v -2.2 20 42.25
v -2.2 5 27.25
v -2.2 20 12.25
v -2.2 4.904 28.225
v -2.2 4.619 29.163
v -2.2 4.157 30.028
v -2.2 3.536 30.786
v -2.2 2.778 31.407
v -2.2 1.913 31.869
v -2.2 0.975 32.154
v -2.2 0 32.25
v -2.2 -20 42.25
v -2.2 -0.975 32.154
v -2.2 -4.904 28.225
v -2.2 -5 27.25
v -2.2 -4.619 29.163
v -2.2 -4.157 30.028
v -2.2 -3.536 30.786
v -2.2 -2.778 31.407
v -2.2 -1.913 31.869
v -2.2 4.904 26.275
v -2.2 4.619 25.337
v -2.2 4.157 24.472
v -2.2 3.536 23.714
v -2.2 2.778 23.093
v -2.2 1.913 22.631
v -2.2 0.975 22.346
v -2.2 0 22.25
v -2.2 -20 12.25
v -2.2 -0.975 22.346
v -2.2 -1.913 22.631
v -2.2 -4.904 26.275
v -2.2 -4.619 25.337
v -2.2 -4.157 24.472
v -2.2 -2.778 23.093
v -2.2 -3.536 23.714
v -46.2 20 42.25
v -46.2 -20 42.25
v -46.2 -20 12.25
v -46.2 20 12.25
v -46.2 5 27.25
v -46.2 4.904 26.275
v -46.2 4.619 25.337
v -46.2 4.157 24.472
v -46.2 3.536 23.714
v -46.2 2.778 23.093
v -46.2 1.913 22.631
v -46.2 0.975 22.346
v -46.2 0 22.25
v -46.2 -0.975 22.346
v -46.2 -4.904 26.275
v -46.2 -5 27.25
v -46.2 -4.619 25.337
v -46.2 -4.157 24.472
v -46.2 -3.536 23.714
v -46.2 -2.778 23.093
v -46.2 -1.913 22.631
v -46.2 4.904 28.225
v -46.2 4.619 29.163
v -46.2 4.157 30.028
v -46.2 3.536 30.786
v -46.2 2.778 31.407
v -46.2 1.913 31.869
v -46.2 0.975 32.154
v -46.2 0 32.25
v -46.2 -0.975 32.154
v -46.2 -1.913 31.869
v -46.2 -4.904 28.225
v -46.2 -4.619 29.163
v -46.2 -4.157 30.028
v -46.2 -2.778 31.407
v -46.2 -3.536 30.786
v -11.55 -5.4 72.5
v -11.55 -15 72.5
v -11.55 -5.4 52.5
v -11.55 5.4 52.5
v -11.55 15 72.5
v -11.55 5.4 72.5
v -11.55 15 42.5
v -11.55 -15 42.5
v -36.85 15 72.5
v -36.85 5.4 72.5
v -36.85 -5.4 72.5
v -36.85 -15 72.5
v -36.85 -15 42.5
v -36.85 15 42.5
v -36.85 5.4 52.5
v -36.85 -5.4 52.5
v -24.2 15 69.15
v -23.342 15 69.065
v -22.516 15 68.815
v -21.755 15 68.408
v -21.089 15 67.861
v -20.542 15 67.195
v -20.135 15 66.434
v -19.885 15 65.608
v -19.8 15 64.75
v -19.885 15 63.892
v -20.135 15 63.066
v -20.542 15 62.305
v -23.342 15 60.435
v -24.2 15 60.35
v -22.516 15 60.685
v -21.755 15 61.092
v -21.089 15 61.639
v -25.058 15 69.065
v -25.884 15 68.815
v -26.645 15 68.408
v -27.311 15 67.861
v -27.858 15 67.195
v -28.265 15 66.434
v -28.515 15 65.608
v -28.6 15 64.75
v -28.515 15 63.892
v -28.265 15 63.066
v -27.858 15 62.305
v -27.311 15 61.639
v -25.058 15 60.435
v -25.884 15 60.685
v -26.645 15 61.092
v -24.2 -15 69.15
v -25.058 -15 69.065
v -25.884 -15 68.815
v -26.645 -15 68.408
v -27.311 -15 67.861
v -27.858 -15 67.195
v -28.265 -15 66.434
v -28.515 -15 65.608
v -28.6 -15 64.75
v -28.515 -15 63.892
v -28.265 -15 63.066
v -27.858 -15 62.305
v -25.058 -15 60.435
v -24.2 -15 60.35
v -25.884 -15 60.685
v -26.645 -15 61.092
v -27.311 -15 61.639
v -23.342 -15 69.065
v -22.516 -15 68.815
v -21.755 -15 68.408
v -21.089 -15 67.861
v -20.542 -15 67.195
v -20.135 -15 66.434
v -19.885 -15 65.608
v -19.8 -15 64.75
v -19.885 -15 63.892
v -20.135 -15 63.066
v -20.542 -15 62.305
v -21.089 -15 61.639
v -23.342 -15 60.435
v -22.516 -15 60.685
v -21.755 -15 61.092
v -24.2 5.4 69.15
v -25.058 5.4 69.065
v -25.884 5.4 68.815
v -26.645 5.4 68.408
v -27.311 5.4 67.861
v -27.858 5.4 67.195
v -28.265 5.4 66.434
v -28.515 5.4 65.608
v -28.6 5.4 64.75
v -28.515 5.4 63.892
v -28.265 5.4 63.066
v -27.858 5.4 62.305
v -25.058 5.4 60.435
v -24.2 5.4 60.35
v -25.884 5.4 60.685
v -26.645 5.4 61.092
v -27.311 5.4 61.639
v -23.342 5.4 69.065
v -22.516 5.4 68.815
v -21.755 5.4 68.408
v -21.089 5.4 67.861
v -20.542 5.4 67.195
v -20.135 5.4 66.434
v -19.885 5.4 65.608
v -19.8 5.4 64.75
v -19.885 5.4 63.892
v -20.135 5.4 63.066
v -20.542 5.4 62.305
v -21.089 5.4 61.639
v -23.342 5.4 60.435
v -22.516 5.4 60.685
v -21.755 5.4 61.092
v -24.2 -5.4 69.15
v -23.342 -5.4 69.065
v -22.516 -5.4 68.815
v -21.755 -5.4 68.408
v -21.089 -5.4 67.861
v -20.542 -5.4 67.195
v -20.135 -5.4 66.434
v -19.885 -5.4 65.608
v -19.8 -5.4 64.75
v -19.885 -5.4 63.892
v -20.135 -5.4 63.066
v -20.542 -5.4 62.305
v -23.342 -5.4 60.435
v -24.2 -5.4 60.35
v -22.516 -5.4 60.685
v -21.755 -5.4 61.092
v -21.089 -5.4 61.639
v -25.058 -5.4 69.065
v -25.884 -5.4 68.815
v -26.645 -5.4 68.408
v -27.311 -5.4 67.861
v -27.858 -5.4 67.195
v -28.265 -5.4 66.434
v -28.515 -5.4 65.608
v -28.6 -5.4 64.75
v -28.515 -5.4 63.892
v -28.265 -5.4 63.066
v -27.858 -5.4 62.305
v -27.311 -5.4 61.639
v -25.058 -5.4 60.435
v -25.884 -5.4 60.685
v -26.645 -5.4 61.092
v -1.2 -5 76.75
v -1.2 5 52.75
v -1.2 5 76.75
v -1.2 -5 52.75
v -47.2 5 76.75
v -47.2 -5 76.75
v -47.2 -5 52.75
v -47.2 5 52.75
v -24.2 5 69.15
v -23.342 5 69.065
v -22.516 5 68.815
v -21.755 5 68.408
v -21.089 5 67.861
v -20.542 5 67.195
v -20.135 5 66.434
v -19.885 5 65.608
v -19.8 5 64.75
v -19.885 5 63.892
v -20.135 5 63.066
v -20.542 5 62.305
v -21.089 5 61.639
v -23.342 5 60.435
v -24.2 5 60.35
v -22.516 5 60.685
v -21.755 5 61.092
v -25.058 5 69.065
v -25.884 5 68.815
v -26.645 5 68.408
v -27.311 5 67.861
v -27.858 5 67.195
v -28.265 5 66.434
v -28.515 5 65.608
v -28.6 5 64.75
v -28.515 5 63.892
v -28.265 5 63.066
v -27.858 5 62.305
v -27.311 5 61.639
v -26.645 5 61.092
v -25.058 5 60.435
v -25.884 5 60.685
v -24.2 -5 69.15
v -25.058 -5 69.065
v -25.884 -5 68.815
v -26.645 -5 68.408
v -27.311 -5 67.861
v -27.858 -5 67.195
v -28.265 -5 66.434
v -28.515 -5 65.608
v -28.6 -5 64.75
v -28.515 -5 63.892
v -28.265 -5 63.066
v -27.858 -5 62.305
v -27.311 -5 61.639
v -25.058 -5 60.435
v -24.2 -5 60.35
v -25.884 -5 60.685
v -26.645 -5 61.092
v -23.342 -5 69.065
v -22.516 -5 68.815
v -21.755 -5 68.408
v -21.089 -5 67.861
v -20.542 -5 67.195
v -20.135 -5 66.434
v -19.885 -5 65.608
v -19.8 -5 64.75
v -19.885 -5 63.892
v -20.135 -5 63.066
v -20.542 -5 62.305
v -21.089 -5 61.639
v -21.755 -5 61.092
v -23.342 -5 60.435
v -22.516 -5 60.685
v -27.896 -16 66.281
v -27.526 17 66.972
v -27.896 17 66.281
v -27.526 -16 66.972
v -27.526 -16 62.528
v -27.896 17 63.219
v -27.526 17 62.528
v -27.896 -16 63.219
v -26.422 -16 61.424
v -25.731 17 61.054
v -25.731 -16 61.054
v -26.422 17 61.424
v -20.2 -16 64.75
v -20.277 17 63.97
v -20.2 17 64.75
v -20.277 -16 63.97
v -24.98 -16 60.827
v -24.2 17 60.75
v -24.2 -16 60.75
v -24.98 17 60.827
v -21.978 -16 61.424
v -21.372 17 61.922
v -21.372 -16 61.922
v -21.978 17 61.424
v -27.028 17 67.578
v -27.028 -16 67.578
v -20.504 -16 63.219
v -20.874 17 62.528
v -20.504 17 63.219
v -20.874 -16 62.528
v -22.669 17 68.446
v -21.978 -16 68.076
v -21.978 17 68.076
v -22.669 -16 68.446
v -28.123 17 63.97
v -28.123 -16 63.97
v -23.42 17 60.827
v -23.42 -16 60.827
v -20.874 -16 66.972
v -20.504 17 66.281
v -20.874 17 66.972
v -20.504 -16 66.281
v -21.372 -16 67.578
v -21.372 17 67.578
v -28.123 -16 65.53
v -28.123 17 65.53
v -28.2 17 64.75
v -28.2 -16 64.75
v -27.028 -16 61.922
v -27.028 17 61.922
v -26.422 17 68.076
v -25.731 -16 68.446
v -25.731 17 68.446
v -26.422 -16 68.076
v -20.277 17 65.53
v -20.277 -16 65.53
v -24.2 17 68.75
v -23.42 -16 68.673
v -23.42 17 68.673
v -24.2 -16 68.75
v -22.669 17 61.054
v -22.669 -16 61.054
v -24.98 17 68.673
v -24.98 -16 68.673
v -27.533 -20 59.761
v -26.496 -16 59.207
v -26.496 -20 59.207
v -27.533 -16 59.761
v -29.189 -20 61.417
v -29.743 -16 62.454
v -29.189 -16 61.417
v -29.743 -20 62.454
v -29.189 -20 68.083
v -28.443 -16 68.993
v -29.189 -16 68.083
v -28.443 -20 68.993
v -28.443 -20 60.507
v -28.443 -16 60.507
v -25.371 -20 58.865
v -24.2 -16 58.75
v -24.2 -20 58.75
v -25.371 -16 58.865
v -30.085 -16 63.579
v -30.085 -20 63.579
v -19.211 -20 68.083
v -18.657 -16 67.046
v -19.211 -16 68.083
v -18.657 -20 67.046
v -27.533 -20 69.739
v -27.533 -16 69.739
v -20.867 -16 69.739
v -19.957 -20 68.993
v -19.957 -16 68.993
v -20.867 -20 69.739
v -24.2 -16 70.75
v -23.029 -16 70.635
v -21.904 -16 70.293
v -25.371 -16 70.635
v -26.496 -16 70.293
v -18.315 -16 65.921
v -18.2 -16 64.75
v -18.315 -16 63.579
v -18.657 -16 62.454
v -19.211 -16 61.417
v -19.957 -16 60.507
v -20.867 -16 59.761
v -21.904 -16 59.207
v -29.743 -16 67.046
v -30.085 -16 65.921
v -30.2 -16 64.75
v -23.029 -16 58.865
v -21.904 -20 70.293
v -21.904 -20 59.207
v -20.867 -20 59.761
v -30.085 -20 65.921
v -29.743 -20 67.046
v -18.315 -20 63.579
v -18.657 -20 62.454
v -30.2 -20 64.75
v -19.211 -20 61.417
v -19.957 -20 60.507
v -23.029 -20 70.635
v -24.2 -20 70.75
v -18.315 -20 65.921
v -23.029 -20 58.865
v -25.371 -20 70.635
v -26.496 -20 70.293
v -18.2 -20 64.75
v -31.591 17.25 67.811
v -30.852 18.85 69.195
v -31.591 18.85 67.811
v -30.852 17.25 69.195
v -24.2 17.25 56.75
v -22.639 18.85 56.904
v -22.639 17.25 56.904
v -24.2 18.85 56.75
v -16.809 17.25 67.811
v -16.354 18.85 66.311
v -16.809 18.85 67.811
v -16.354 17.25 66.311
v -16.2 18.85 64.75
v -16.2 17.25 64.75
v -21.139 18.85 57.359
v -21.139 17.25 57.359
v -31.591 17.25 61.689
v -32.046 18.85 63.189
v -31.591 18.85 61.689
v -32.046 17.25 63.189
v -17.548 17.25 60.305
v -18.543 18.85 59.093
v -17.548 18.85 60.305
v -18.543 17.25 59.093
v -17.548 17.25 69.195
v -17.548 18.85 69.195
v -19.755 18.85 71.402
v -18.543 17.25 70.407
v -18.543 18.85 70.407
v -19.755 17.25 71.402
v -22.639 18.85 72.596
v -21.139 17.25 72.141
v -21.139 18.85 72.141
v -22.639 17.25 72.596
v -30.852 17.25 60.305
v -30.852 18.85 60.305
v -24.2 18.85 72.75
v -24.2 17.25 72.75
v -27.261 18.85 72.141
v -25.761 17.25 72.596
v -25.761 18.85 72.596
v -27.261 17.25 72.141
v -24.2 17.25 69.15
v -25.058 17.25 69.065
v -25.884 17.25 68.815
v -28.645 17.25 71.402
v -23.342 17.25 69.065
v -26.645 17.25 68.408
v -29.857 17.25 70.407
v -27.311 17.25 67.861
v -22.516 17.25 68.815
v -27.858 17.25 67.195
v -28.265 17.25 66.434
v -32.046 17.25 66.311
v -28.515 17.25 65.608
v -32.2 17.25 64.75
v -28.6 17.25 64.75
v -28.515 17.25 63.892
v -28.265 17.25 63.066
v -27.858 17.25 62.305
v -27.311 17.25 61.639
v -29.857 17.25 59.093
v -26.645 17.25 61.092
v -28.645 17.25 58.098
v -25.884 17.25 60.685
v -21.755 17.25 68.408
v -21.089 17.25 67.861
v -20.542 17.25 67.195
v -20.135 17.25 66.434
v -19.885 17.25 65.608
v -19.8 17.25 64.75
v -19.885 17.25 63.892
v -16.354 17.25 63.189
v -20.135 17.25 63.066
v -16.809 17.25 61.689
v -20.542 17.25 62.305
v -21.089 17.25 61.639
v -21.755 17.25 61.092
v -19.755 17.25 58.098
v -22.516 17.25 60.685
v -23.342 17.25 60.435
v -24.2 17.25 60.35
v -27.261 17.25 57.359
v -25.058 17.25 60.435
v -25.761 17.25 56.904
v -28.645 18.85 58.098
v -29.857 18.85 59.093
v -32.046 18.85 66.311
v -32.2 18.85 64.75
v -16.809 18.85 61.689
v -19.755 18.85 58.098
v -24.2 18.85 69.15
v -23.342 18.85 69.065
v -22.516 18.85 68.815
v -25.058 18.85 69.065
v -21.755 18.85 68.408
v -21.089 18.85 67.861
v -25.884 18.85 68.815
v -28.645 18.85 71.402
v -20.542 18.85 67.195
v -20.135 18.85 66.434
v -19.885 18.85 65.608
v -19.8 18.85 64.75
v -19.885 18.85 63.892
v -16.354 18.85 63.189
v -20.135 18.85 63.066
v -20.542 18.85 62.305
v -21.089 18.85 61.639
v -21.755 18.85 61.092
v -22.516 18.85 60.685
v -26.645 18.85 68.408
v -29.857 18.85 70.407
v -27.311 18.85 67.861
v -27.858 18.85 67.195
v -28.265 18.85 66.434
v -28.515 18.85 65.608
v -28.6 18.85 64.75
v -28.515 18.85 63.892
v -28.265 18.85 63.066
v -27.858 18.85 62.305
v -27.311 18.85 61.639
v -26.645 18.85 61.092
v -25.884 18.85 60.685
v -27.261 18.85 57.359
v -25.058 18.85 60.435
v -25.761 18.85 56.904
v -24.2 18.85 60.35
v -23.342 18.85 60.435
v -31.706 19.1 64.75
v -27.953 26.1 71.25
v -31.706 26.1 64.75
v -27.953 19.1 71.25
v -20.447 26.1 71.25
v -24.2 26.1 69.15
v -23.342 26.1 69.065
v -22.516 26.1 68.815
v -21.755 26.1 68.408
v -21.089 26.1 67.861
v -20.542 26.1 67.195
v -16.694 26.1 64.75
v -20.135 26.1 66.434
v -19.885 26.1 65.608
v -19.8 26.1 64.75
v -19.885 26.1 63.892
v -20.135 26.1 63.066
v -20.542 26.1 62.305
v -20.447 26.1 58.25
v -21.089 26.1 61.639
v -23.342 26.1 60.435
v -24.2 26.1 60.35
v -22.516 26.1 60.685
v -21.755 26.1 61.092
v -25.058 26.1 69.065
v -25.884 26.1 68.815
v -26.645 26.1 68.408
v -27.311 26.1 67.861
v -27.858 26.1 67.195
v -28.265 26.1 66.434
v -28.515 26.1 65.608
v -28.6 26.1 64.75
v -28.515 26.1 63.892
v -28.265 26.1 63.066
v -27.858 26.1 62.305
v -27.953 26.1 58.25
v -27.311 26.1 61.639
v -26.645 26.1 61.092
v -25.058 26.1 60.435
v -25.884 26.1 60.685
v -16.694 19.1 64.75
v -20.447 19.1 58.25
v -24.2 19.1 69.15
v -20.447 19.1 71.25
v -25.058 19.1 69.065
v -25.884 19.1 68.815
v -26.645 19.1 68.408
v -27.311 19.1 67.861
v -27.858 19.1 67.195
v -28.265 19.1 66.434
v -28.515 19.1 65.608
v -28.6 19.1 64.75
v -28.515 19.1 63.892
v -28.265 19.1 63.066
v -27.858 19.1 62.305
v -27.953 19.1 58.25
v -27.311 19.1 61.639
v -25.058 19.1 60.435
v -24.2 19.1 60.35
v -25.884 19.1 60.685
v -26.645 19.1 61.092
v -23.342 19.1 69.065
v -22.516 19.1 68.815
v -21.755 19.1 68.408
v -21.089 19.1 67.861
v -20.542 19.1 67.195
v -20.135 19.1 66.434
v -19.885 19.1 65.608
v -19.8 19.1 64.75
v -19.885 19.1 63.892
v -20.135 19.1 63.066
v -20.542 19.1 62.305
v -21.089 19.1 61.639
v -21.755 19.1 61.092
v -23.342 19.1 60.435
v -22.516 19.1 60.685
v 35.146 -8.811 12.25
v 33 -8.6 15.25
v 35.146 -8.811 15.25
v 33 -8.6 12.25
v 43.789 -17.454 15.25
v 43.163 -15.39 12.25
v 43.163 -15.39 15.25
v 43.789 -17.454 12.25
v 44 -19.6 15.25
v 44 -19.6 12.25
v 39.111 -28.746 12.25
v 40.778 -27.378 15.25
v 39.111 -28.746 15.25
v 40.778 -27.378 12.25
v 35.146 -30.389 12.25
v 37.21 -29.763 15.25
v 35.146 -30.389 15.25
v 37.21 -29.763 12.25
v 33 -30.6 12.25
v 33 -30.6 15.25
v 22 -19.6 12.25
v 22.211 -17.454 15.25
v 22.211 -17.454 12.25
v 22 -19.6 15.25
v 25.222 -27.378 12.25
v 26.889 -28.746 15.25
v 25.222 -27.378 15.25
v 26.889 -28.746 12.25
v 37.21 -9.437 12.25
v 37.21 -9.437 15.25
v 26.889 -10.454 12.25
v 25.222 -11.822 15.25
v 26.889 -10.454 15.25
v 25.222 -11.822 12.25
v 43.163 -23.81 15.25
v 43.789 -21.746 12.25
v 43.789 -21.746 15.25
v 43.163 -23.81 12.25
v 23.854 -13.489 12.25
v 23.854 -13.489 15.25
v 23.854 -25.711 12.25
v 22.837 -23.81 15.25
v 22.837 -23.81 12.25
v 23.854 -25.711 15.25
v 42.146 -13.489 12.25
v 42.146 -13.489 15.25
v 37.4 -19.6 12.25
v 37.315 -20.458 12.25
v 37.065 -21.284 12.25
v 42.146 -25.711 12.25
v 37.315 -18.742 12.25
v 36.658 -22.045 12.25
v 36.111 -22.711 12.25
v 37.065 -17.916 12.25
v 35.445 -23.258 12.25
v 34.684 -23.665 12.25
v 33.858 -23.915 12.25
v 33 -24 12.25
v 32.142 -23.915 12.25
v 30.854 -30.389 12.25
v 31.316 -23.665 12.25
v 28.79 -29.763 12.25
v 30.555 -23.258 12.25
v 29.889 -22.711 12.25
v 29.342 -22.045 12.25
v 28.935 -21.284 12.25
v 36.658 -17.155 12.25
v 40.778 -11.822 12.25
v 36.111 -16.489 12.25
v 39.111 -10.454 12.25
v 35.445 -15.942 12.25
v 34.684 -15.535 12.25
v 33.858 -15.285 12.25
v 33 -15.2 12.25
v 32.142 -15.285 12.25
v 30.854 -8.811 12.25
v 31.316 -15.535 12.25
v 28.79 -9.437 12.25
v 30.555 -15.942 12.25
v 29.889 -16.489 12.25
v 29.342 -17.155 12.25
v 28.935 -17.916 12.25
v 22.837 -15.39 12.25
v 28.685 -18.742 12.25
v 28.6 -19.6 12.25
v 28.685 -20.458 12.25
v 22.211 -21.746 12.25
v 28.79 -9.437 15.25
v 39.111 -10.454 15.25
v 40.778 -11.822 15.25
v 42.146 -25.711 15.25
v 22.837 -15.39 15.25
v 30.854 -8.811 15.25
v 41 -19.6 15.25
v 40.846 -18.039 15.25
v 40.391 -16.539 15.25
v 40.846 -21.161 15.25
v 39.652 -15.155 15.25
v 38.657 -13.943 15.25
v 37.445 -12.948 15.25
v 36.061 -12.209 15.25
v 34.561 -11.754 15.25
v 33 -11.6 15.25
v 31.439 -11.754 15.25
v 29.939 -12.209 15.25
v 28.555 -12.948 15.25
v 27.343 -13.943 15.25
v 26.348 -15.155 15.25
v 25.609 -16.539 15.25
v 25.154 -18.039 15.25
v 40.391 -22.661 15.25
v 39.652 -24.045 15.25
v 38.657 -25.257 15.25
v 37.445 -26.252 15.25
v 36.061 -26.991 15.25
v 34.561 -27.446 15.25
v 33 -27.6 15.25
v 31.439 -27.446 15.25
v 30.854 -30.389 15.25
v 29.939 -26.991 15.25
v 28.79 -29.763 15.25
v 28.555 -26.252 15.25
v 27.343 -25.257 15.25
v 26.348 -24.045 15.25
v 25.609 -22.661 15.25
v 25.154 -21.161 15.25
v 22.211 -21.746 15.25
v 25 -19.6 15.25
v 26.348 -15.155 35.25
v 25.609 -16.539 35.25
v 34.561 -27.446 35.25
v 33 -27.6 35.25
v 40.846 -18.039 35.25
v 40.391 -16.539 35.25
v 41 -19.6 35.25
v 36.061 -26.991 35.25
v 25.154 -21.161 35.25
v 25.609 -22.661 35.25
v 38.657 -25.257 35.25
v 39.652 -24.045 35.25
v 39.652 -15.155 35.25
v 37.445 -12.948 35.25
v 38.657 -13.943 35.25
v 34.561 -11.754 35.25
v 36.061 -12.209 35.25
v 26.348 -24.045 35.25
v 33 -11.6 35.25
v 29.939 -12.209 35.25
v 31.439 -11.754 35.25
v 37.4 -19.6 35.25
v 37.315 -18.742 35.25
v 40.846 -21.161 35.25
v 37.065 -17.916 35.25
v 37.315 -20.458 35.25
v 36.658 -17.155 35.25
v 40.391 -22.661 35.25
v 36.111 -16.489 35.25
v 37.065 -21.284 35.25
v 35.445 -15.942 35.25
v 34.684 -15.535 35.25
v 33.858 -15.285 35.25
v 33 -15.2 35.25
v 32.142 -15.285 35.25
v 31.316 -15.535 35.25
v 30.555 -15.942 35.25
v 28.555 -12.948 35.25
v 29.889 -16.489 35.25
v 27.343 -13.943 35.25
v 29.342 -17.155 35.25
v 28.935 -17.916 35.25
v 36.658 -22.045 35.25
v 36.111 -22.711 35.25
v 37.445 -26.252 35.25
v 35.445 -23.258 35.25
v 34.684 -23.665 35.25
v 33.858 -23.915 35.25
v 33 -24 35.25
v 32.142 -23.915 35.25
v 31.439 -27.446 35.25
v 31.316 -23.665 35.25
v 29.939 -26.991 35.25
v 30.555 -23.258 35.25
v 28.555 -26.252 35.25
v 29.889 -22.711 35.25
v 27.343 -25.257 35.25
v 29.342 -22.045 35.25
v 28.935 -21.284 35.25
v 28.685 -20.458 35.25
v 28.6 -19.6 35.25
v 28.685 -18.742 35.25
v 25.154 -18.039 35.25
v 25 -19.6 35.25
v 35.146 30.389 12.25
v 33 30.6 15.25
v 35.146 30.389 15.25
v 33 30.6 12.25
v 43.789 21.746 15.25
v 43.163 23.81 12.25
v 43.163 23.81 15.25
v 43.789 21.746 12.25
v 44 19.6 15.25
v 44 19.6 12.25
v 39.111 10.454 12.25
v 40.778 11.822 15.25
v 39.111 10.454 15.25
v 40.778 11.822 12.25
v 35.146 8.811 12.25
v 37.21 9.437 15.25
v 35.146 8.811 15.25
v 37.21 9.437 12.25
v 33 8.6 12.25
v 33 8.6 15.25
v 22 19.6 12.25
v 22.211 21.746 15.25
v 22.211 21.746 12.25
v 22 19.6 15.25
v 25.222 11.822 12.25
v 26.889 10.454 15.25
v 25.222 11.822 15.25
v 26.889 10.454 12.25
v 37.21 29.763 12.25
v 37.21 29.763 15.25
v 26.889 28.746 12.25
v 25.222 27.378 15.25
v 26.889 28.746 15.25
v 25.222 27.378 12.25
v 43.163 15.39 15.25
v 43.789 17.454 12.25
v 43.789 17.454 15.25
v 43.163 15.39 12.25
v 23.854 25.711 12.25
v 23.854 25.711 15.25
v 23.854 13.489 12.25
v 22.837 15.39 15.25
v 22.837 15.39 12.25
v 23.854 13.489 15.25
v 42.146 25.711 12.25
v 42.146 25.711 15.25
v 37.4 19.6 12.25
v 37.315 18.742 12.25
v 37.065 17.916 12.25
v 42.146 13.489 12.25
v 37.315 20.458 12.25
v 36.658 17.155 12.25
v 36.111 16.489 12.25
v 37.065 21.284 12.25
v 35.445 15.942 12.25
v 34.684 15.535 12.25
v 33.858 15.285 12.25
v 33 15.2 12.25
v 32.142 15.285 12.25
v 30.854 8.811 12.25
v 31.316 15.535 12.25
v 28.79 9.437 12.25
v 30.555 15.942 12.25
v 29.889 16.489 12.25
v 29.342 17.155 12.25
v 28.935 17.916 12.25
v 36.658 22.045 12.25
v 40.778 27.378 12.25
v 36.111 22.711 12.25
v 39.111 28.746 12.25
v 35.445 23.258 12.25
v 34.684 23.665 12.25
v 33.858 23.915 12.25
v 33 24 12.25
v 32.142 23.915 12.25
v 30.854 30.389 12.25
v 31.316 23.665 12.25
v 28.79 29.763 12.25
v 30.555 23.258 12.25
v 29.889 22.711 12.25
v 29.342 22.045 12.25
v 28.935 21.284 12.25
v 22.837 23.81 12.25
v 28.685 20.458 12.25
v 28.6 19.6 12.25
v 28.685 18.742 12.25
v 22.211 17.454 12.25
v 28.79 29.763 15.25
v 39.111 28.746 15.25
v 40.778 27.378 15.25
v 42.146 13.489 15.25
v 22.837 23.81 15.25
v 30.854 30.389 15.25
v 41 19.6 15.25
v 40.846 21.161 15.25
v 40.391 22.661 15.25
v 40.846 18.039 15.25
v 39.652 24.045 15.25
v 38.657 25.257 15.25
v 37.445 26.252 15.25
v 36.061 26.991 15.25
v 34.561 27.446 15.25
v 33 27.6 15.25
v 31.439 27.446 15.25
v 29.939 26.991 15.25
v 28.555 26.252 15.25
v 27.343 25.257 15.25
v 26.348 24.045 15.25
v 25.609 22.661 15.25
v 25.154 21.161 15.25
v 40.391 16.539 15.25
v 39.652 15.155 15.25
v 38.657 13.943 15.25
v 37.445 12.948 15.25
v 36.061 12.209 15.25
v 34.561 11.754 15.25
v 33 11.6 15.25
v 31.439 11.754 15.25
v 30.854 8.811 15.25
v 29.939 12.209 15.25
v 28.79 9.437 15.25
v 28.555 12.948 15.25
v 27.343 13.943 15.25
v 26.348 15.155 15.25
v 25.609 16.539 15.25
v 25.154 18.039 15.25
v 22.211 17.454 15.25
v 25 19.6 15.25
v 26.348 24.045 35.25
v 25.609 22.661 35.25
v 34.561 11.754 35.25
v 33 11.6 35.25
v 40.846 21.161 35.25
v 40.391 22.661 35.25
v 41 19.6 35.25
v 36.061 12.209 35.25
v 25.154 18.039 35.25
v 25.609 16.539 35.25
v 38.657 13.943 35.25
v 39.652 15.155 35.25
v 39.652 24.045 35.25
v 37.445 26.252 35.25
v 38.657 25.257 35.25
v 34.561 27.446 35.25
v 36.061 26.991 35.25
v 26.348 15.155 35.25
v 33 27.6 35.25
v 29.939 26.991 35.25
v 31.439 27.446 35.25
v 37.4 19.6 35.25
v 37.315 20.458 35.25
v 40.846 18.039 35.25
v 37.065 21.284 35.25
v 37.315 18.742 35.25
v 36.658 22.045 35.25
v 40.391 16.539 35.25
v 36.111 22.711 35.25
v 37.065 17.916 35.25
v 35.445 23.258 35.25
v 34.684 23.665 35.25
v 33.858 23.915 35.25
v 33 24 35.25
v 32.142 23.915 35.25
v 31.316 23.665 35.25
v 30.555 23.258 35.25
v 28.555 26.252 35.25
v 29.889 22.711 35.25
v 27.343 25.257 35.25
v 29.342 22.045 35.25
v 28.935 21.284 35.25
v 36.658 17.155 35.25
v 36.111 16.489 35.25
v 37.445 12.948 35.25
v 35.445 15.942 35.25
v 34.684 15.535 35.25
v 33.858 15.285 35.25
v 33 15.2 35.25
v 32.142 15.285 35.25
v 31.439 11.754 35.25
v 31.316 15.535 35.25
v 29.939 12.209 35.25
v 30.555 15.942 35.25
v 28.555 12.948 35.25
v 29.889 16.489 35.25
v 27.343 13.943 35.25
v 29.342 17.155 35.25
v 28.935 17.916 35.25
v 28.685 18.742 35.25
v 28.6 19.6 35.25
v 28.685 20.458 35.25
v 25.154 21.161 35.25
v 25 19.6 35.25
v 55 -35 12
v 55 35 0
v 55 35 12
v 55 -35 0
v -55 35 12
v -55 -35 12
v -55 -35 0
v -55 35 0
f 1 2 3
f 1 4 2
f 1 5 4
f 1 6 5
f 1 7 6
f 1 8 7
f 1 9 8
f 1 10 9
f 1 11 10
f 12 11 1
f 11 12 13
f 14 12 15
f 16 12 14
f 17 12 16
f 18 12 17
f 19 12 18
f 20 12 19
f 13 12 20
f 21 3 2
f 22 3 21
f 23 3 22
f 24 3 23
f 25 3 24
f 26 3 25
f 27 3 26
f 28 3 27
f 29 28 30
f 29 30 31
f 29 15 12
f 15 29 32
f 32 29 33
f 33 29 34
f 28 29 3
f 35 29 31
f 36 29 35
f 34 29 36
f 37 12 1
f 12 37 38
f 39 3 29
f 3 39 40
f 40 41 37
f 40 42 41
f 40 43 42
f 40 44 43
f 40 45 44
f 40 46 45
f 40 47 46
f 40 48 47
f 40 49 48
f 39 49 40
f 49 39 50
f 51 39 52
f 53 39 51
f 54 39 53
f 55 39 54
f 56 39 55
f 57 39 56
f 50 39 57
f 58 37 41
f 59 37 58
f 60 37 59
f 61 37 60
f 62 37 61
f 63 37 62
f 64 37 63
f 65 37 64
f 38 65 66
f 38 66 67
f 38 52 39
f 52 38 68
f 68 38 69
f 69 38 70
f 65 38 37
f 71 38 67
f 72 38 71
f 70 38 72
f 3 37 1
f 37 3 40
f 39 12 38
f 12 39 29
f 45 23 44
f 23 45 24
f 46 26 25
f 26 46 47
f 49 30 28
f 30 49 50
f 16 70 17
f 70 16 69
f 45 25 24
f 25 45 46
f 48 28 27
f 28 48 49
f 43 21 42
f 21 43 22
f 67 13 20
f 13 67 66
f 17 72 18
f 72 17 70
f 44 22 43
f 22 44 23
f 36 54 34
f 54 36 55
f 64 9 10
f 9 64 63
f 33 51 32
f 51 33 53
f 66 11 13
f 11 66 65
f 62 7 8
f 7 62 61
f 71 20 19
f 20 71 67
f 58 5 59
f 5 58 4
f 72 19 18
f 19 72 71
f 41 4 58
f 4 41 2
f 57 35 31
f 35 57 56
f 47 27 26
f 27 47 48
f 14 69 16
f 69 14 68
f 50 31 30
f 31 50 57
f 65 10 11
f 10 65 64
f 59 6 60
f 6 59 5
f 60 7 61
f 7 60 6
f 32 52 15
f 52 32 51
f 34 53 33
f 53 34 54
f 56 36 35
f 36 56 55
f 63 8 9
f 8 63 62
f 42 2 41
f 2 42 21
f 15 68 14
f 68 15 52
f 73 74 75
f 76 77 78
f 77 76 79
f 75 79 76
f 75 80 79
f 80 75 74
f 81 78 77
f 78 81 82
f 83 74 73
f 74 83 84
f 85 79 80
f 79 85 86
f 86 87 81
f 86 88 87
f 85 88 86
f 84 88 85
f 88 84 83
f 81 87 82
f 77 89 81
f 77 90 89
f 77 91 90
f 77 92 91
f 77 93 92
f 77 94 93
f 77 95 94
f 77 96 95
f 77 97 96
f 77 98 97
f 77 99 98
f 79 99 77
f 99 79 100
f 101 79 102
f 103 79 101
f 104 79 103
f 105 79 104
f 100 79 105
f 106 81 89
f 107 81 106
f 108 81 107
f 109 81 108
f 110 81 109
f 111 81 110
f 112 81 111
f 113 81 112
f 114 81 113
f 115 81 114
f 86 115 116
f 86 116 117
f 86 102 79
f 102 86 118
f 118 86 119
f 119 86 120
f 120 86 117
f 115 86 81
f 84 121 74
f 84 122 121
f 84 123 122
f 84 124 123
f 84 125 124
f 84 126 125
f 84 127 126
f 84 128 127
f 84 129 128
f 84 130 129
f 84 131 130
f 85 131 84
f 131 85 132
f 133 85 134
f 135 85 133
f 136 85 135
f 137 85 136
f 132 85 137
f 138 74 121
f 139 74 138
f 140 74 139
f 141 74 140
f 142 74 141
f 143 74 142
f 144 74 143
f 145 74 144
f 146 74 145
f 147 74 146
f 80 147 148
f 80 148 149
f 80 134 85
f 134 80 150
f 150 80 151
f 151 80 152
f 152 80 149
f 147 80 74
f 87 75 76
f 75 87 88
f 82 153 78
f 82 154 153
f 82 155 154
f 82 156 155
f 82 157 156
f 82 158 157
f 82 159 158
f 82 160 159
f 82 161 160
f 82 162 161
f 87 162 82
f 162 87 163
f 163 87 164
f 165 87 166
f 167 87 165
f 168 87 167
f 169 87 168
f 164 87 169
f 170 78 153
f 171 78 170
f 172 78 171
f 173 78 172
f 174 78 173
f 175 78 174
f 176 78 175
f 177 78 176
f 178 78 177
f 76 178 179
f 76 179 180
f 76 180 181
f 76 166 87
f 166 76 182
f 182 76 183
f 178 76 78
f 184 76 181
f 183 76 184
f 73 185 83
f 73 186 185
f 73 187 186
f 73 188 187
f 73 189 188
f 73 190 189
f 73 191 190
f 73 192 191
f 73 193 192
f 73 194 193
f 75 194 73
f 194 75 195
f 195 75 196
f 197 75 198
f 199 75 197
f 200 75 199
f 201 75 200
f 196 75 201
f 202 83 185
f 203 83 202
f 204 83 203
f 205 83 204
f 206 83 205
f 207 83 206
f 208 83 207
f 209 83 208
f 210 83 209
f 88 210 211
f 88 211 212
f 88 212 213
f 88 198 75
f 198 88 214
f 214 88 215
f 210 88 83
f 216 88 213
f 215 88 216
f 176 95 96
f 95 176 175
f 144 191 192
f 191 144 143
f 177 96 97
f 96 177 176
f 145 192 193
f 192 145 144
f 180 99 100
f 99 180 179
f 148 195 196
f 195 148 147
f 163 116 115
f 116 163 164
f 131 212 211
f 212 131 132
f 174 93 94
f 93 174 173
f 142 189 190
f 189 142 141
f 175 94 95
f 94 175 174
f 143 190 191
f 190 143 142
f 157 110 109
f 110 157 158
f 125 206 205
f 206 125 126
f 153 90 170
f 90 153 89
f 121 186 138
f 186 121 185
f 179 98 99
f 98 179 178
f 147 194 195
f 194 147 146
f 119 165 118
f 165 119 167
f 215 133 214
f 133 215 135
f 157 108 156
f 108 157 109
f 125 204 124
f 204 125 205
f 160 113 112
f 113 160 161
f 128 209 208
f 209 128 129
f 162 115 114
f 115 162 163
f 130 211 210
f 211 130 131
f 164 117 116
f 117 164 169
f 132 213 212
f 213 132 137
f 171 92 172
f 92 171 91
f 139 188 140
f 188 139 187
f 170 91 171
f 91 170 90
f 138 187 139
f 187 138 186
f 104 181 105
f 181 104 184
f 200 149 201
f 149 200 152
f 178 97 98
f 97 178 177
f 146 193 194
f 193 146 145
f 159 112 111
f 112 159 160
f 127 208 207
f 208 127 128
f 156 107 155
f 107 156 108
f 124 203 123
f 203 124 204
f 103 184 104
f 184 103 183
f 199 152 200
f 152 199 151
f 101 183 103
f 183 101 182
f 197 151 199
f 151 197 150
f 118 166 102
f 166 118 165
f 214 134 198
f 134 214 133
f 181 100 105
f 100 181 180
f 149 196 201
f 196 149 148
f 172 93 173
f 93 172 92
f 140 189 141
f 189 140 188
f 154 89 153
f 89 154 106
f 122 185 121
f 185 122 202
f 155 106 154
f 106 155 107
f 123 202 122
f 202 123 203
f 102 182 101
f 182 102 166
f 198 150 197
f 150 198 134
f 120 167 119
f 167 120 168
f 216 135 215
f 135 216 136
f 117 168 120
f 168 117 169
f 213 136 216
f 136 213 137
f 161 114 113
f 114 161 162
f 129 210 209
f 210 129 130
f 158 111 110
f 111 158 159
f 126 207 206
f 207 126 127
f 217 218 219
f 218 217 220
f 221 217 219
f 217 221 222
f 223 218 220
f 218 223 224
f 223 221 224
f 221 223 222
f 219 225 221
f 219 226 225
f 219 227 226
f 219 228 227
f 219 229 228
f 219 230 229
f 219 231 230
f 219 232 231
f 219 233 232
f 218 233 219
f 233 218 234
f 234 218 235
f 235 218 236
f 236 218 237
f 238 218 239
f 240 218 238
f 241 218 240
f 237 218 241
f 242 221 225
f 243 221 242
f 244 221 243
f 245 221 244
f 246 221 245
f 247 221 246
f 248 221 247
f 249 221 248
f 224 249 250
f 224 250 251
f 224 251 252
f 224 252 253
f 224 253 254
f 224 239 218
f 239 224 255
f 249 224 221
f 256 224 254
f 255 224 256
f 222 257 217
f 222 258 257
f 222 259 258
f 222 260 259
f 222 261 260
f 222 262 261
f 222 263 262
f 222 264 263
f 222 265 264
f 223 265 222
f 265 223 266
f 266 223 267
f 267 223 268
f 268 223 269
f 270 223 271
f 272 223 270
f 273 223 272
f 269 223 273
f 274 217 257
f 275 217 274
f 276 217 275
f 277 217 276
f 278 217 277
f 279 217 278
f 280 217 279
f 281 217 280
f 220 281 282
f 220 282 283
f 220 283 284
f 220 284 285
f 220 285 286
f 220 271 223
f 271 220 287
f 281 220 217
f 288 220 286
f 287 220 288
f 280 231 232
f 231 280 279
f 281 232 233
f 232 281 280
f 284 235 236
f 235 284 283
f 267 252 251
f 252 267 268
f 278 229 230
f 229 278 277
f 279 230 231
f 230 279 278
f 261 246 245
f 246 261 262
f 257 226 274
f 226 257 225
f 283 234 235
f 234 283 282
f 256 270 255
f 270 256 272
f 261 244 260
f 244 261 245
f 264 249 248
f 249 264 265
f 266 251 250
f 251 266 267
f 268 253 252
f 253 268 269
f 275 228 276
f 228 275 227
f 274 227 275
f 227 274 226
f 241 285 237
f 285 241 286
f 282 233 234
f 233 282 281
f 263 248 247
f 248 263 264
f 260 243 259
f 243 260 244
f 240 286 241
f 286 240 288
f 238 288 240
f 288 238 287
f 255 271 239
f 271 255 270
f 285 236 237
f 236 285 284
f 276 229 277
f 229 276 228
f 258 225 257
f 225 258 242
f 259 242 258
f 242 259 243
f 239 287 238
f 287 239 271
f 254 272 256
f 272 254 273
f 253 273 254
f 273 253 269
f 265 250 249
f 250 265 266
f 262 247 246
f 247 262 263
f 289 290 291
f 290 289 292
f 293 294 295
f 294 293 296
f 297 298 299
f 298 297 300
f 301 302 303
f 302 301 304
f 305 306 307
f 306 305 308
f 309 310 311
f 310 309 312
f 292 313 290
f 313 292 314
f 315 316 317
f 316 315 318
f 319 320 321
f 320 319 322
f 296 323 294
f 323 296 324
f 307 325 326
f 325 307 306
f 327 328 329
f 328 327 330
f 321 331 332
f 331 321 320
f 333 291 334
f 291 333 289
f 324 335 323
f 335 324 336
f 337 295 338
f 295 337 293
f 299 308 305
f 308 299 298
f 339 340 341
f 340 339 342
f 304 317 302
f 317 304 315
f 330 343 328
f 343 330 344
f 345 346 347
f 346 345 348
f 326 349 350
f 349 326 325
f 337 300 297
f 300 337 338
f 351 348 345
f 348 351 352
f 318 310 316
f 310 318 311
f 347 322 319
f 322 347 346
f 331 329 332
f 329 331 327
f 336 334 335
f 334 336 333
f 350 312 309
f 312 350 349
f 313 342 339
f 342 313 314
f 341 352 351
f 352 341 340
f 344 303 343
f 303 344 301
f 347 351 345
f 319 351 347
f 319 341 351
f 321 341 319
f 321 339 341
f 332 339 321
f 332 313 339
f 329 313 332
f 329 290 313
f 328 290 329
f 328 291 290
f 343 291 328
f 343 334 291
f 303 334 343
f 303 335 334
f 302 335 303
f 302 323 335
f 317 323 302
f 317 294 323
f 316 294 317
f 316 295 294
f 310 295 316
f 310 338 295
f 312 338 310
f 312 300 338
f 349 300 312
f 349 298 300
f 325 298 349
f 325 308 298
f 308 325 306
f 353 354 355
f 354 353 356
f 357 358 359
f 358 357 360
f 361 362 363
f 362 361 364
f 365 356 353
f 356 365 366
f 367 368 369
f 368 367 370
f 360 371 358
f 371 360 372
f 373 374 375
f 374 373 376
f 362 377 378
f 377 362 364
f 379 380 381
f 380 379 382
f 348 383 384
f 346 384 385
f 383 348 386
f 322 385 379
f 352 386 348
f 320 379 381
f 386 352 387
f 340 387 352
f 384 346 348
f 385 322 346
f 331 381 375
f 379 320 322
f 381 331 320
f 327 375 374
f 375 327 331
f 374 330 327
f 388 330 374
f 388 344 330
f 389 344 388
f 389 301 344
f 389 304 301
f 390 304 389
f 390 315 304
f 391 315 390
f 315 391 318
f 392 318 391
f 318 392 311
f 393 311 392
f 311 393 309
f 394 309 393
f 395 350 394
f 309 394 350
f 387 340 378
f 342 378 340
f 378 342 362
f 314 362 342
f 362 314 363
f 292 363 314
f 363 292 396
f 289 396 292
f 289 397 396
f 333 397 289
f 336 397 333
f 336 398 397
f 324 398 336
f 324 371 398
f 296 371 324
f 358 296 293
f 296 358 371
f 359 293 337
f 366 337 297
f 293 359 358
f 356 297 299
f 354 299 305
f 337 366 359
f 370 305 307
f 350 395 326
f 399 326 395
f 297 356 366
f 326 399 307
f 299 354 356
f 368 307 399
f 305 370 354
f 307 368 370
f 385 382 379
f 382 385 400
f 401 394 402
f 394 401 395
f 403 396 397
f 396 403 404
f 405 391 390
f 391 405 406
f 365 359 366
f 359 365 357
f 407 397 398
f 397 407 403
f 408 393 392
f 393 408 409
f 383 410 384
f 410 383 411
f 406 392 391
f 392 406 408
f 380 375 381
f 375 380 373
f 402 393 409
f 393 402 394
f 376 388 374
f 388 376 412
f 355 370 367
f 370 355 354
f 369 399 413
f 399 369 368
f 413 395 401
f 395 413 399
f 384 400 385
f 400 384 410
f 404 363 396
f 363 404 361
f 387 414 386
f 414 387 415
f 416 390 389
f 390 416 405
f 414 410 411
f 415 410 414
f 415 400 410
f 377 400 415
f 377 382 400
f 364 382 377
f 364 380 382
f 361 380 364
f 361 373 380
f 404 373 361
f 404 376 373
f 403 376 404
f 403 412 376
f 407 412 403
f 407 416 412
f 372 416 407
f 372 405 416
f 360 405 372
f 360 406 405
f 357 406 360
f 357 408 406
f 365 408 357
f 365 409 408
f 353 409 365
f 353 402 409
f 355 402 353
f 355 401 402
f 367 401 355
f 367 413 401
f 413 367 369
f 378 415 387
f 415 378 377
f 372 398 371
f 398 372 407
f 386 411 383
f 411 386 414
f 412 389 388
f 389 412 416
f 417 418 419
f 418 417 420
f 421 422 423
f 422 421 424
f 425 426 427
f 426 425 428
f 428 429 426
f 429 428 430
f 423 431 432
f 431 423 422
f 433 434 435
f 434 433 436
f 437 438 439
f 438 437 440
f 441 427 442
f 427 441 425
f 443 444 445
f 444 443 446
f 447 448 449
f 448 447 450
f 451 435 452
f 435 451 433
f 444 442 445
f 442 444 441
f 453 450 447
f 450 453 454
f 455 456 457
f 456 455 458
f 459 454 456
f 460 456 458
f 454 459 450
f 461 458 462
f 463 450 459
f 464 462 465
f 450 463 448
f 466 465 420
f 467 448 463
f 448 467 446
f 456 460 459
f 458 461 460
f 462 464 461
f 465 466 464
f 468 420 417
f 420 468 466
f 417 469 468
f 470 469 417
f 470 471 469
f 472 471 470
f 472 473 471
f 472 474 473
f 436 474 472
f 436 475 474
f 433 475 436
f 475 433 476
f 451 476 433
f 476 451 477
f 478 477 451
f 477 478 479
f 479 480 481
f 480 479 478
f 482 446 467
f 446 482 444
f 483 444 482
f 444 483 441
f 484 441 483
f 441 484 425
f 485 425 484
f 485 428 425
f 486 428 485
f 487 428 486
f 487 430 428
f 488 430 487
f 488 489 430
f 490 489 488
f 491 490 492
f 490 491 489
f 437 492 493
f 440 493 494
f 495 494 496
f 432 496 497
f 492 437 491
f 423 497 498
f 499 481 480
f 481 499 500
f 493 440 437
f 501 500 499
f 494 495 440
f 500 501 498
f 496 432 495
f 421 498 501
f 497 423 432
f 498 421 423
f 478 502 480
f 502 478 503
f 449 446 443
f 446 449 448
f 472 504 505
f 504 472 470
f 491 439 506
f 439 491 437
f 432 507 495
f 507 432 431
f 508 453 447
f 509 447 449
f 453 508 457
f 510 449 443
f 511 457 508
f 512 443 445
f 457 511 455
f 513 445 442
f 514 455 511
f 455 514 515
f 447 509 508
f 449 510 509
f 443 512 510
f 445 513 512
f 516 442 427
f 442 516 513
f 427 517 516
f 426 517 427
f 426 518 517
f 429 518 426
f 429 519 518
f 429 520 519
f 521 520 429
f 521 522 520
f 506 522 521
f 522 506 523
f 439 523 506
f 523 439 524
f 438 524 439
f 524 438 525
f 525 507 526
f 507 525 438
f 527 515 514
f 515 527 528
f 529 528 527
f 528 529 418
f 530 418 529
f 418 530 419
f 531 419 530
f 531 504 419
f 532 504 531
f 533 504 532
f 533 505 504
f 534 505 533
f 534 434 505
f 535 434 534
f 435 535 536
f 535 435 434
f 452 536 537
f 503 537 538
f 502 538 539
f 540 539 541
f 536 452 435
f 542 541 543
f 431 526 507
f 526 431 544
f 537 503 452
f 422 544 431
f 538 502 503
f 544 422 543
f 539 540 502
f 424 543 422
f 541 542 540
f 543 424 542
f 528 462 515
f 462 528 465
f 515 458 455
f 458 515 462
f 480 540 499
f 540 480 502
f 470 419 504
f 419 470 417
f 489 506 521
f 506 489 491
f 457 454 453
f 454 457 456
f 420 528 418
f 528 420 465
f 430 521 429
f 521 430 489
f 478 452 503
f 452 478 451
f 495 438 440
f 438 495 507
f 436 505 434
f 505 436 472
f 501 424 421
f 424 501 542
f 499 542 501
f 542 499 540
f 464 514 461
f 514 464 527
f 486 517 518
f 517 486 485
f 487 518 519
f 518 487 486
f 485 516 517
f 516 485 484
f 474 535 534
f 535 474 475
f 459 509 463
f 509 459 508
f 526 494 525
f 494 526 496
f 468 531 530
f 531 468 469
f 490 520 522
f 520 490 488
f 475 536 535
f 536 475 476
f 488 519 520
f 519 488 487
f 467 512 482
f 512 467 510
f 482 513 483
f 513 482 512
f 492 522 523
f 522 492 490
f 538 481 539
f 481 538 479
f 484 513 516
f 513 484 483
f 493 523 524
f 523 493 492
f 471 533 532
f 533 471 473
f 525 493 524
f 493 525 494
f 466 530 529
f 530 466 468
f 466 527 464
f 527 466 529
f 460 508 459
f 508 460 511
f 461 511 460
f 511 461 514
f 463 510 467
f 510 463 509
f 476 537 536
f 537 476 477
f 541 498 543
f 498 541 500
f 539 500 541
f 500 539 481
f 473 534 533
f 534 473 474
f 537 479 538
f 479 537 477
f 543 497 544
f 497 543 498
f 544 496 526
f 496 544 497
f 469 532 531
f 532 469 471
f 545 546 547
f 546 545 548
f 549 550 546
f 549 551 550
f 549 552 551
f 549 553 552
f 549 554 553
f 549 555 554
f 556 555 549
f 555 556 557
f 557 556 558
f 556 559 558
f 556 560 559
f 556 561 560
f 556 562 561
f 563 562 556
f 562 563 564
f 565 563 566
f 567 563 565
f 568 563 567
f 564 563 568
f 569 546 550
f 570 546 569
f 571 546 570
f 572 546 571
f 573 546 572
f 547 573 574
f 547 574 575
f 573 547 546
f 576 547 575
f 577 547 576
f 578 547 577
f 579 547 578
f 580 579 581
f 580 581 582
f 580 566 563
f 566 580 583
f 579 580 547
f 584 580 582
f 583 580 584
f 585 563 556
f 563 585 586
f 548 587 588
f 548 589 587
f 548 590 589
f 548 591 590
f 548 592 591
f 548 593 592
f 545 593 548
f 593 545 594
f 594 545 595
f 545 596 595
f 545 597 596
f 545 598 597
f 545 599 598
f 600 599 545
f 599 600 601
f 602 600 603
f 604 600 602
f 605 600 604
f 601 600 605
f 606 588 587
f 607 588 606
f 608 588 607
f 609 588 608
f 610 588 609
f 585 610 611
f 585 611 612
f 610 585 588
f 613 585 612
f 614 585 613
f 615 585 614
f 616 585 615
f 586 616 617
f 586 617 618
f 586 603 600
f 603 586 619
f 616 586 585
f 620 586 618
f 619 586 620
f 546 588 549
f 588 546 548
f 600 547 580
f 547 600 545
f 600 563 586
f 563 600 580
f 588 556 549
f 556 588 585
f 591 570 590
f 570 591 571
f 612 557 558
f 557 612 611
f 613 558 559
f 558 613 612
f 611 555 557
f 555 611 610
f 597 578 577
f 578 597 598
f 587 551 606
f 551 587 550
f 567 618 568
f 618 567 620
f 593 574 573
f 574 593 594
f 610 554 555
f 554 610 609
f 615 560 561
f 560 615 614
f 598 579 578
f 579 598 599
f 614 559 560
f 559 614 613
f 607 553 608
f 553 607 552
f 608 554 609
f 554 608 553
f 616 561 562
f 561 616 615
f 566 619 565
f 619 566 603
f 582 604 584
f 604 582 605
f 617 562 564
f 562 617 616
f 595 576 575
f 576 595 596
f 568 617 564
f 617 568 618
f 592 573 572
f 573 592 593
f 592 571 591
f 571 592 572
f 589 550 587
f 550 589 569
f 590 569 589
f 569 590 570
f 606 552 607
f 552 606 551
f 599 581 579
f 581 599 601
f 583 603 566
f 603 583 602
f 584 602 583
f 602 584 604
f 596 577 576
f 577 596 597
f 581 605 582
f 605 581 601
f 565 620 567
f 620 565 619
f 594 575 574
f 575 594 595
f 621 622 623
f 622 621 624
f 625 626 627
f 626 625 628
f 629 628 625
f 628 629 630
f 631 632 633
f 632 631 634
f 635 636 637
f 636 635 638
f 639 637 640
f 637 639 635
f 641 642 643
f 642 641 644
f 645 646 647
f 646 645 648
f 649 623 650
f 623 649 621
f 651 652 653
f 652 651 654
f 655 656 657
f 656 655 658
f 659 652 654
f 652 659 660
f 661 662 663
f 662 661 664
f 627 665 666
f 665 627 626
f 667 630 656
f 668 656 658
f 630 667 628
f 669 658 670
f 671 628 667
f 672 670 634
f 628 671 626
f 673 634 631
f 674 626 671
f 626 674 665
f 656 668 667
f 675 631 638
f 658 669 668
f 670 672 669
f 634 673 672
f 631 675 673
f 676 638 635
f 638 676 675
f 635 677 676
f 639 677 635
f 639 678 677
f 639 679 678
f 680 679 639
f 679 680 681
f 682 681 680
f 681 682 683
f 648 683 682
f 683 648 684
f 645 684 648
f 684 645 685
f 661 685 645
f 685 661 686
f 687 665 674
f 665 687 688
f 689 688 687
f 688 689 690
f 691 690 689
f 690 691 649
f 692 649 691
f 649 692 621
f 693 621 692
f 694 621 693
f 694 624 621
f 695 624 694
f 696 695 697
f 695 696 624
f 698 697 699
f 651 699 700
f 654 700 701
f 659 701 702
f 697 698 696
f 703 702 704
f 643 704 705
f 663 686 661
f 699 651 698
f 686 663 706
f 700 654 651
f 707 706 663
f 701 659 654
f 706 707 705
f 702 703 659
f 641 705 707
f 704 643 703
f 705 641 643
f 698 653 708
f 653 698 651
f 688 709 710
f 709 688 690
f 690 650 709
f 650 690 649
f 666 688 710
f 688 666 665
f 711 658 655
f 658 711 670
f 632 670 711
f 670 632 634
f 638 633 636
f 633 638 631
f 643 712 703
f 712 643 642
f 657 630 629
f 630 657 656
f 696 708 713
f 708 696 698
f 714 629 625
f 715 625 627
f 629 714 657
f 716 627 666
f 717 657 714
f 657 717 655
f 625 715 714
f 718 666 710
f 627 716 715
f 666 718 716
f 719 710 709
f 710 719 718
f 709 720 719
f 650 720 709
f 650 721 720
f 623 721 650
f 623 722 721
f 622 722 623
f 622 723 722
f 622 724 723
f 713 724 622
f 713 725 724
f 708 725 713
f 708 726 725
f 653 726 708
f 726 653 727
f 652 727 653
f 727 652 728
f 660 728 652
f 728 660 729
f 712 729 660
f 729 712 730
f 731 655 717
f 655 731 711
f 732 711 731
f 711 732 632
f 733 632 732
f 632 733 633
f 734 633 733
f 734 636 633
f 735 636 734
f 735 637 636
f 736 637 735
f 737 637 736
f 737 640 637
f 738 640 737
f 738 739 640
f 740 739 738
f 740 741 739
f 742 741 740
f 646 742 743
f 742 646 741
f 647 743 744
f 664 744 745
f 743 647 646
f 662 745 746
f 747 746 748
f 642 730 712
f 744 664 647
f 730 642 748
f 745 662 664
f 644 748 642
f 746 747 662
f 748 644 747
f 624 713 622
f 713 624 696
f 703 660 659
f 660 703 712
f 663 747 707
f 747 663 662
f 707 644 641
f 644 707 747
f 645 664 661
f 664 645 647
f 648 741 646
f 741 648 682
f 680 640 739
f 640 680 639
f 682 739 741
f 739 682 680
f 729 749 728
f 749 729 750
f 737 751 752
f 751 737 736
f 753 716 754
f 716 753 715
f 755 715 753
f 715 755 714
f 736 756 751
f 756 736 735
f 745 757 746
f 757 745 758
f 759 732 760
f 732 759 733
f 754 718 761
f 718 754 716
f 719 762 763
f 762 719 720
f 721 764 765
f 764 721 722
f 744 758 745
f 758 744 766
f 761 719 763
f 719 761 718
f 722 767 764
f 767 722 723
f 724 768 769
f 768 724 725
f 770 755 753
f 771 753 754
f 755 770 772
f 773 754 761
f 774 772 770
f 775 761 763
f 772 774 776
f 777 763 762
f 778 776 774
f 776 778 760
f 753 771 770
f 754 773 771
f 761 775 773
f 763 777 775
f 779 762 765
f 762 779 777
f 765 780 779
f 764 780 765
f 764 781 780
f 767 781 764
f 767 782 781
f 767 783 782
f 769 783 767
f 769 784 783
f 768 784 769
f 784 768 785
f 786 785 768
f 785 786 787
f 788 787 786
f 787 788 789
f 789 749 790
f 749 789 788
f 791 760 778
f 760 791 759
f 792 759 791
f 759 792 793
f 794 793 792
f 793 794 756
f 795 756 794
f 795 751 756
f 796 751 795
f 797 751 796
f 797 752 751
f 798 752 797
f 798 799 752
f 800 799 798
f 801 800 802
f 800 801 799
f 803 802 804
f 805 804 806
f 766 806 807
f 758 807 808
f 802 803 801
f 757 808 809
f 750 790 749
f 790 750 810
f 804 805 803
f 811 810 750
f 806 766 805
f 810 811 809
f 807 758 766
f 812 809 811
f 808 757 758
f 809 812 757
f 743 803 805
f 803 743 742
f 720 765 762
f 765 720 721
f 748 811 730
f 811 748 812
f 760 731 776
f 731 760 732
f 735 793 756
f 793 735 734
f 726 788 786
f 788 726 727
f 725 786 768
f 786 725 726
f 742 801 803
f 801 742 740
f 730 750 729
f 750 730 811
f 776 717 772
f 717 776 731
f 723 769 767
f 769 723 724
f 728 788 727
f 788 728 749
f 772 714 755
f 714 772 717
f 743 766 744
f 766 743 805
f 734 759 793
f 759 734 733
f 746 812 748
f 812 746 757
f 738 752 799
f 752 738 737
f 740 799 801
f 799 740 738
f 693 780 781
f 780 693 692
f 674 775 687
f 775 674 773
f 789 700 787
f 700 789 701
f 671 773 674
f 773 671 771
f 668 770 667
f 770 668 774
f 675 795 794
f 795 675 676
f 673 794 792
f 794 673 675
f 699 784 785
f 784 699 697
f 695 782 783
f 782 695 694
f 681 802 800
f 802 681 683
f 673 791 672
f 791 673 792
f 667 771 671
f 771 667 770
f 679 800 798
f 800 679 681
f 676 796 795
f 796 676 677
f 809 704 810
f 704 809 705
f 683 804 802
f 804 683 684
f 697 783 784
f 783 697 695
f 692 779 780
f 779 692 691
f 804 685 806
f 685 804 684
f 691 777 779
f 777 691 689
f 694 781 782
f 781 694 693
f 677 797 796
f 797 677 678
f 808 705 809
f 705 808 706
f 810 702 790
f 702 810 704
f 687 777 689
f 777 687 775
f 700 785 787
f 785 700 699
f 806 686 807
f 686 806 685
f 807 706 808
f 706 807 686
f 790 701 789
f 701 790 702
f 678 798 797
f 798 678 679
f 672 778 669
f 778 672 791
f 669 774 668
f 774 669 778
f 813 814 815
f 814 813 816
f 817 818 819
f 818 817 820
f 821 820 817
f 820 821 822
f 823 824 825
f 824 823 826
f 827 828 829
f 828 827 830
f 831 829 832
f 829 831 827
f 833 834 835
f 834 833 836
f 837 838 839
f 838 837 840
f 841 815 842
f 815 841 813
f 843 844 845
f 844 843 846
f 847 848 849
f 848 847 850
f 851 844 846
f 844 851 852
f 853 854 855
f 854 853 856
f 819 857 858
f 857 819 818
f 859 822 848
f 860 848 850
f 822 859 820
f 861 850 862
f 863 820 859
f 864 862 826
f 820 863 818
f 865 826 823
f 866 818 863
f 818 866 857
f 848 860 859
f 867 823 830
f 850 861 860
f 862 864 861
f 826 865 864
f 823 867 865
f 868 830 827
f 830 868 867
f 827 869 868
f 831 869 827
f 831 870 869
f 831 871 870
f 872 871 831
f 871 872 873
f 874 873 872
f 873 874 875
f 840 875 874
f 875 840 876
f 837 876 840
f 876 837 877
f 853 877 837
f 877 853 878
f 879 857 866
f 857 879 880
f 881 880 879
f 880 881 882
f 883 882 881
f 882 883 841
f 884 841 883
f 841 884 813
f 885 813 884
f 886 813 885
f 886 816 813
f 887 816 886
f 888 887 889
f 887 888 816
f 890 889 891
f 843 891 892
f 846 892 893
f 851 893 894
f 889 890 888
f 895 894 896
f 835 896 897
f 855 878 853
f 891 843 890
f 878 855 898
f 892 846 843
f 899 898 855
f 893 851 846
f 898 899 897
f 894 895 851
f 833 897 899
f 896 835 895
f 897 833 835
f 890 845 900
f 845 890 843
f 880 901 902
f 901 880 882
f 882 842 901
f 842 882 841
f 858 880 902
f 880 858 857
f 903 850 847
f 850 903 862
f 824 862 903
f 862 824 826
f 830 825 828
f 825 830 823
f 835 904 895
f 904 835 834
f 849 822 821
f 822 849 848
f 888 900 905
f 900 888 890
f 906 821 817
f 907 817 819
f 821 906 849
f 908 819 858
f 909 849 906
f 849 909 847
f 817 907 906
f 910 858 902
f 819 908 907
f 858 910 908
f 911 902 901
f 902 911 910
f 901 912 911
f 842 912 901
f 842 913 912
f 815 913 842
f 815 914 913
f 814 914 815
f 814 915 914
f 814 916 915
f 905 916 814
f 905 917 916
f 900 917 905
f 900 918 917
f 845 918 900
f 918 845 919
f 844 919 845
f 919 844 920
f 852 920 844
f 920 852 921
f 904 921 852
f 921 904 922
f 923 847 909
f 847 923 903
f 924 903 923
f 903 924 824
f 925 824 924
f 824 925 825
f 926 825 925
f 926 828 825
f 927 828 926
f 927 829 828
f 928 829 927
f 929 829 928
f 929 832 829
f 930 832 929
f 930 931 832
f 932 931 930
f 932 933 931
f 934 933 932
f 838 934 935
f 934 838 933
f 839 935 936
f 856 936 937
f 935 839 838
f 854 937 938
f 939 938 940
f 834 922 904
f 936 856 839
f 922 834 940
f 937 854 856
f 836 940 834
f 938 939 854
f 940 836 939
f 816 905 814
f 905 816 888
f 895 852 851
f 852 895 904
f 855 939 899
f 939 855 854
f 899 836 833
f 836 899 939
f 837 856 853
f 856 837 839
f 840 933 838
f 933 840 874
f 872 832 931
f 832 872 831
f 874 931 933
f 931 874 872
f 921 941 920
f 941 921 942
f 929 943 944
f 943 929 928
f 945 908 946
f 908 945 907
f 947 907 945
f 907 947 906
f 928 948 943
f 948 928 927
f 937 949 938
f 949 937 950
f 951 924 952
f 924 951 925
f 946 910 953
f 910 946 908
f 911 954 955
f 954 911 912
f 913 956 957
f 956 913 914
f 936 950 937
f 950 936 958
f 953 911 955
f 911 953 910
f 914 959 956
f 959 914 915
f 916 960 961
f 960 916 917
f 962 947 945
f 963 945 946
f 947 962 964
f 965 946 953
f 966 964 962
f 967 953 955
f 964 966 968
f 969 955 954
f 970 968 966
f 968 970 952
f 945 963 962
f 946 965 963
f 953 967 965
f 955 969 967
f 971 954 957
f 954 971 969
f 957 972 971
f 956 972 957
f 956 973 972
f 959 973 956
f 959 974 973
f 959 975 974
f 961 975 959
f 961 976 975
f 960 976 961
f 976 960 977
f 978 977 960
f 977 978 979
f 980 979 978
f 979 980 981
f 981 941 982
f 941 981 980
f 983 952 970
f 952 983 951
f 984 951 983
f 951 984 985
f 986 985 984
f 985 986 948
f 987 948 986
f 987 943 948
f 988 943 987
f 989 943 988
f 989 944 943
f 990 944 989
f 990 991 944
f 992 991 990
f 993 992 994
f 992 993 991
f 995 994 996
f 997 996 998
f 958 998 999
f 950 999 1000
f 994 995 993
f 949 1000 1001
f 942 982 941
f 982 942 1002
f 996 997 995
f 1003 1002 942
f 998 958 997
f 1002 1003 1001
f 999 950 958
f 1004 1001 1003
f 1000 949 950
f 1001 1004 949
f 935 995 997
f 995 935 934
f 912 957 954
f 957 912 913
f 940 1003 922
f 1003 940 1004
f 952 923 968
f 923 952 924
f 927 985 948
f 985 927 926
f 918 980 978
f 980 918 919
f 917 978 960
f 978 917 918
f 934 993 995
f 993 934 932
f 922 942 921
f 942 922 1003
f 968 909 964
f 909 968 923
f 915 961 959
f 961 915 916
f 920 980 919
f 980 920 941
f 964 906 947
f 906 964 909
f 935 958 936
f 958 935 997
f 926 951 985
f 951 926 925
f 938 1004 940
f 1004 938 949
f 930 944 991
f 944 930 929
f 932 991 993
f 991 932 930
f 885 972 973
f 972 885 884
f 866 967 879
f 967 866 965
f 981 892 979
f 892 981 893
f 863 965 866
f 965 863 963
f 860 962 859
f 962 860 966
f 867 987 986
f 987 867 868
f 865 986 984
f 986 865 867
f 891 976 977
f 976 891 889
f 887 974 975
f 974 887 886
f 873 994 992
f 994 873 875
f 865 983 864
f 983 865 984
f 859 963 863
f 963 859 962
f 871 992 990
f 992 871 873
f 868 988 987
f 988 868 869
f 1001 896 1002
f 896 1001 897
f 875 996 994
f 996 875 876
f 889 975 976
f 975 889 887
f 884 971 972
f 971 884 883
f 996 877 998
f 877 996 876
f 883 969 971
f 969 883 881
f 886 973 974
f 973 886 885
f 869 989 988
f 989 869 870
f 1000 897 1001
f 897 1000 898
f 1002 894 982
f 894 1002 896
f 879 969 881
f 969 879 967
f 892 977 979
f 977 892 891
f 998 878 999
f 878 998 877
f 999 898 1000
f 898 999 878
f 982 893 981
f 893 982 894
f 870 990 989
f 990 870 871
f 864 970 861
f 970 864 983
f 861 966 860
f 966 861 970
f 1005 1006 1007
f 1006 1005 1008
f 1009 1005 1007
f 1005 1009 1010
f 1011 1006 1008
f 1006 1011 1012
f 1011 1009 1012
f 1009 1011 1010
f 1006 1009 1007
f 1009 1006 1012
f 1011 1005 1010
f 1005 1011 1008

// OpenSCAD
$fn = 32;

// ------------------------------------------------------------------------
// Indexing jig: plate 110 x 70 mm, pin d8
// Every part is its own module, assembly() places every instance.
// ------------------------------------------------------------------------

// --- part 1 ---
module jig_plate() {
  difference() {
    translate([-55, -35, 0]) cube([110, 70, 12]);
  }
}

// --- part 2 ---
module locator_block() {
  difference() {
    translate([-22, -20, 0]) cube([44, 40, 30]);
    translate([0, 0, 15]) rotate([0, 90, 0]) cylinder(h = 46, d = 10, center = true);
  }
}

// --- part 3 ---
module index_fork() {
  difference() {
    translate([-12.65, -15, 0]) cube([25.3, 30, 30]);
    translate([-13.65, -5.4, 10]) cube([27.3, 10.8, 21]);
    translate([0, 0, 22.25]) rotate([90, 0, 0]) cylinder(h = 32, d = 8.8, center = true);
  }
}

// --- part 4 ---
module index_arm() {
  difference() {
    translate([-23, -5, 0]) cube([46, 10, 24]);
    translate([0, 0, 12]) rotate([90, 0, 0]) cylinder(h = 12, d = 8.8, center = true);
  }
}

// --- part 5 ---
module index_pin() {
  rotate([0, 90, 0]) cylinder(h = 34, d = 8, center = true);
  translate([-20, 0, 0]) rotate([0, 90, 0]) cylinder(h = 4, d = 12);
}

// --- part 6 ---
module pin_washer() {
  difference() {
      translate([0, 0, 0]) cylinder(h = 1.6, d = 16);
      translate([0, 0, -1]) cylinder(h = 3.6, d = 8.8);
    }
}

// --- part 7 ---
module lock_nut() {
  difference() {
    linear_extrude(height = 7) polygon(points = [[7.506, 0], [3.753, 6.5], [-3.753, 6.5], [-7.506, 0], [-3.753, -6.5], [3.753, -6.5]]);
    translate([0, 0, -1]) cylinder(h = 9, d = 8.8);
  }
}

// --- part 8 ---
module guide_bush_a() {
  difference() {
    union() {
      cylinder(h = 3, d = 22);
      translate([0, 0, 3]) cylinder(h = 20, d = 16);
    }
    translate([0, 0, -1]) cylinder(h = 25, d = 8.8);
  }
}

// --- part 9 ---
module guide_bush_b() {
  difference() {
    union() {
      cylinder(h = 3, d = 22);
      translate([0, 0, 3]) cylinder(h = 20, d = 16);
    }
    translate([0, 0, -1]) cylinder(h = 25, d = 8.8);
  }
}

// --- assembly ---
module assembly() {
  color([0.80, 0.24, 0.20]) translate([0, 0, 0]) rotate([0, 0, 0]) jig_plate();
  color([0.20, 0.45, 0.75]) translate([-24.2, 0, 12.25]) rotate([0, 0, 0]) locator_block();
  color([0.25, 0.62, 0.32]) translate([-24.2, 0, 42.5]) rotate([0, 0, 0]) index_fork();
  color([0.92, 0.70, 0.18]) translate([-24.2, 0, 52.75]) rotate([0, 0, 0]) index_arm();
  color([0.58, 0.35, 0.70]) translate([-24.2, 0, 64.75]) rotate([0, 0, 90]) index_pin();
  color([0.16, 0.66, 0.66]) translate([-24.2, 18.85, 64.75]) rotate([90, 0, 0]) pin_washer();
  color([0.85, 0.48, 0.18]) translate([-24.2, 26.1, 64.75]) rotate([90, 0, 0]) lock_nut();
  color([0.55, 0.60, 0.65]) translate([33, -19.6, 12.25]) rotate([0, 0, 0]) guide_bush_a();
  color([0.75, 0.30, 0.55]) translate([33, 19.6, 12.25]) rotate([0, 0, 0]) guide_bush_b();
}

assembly();
